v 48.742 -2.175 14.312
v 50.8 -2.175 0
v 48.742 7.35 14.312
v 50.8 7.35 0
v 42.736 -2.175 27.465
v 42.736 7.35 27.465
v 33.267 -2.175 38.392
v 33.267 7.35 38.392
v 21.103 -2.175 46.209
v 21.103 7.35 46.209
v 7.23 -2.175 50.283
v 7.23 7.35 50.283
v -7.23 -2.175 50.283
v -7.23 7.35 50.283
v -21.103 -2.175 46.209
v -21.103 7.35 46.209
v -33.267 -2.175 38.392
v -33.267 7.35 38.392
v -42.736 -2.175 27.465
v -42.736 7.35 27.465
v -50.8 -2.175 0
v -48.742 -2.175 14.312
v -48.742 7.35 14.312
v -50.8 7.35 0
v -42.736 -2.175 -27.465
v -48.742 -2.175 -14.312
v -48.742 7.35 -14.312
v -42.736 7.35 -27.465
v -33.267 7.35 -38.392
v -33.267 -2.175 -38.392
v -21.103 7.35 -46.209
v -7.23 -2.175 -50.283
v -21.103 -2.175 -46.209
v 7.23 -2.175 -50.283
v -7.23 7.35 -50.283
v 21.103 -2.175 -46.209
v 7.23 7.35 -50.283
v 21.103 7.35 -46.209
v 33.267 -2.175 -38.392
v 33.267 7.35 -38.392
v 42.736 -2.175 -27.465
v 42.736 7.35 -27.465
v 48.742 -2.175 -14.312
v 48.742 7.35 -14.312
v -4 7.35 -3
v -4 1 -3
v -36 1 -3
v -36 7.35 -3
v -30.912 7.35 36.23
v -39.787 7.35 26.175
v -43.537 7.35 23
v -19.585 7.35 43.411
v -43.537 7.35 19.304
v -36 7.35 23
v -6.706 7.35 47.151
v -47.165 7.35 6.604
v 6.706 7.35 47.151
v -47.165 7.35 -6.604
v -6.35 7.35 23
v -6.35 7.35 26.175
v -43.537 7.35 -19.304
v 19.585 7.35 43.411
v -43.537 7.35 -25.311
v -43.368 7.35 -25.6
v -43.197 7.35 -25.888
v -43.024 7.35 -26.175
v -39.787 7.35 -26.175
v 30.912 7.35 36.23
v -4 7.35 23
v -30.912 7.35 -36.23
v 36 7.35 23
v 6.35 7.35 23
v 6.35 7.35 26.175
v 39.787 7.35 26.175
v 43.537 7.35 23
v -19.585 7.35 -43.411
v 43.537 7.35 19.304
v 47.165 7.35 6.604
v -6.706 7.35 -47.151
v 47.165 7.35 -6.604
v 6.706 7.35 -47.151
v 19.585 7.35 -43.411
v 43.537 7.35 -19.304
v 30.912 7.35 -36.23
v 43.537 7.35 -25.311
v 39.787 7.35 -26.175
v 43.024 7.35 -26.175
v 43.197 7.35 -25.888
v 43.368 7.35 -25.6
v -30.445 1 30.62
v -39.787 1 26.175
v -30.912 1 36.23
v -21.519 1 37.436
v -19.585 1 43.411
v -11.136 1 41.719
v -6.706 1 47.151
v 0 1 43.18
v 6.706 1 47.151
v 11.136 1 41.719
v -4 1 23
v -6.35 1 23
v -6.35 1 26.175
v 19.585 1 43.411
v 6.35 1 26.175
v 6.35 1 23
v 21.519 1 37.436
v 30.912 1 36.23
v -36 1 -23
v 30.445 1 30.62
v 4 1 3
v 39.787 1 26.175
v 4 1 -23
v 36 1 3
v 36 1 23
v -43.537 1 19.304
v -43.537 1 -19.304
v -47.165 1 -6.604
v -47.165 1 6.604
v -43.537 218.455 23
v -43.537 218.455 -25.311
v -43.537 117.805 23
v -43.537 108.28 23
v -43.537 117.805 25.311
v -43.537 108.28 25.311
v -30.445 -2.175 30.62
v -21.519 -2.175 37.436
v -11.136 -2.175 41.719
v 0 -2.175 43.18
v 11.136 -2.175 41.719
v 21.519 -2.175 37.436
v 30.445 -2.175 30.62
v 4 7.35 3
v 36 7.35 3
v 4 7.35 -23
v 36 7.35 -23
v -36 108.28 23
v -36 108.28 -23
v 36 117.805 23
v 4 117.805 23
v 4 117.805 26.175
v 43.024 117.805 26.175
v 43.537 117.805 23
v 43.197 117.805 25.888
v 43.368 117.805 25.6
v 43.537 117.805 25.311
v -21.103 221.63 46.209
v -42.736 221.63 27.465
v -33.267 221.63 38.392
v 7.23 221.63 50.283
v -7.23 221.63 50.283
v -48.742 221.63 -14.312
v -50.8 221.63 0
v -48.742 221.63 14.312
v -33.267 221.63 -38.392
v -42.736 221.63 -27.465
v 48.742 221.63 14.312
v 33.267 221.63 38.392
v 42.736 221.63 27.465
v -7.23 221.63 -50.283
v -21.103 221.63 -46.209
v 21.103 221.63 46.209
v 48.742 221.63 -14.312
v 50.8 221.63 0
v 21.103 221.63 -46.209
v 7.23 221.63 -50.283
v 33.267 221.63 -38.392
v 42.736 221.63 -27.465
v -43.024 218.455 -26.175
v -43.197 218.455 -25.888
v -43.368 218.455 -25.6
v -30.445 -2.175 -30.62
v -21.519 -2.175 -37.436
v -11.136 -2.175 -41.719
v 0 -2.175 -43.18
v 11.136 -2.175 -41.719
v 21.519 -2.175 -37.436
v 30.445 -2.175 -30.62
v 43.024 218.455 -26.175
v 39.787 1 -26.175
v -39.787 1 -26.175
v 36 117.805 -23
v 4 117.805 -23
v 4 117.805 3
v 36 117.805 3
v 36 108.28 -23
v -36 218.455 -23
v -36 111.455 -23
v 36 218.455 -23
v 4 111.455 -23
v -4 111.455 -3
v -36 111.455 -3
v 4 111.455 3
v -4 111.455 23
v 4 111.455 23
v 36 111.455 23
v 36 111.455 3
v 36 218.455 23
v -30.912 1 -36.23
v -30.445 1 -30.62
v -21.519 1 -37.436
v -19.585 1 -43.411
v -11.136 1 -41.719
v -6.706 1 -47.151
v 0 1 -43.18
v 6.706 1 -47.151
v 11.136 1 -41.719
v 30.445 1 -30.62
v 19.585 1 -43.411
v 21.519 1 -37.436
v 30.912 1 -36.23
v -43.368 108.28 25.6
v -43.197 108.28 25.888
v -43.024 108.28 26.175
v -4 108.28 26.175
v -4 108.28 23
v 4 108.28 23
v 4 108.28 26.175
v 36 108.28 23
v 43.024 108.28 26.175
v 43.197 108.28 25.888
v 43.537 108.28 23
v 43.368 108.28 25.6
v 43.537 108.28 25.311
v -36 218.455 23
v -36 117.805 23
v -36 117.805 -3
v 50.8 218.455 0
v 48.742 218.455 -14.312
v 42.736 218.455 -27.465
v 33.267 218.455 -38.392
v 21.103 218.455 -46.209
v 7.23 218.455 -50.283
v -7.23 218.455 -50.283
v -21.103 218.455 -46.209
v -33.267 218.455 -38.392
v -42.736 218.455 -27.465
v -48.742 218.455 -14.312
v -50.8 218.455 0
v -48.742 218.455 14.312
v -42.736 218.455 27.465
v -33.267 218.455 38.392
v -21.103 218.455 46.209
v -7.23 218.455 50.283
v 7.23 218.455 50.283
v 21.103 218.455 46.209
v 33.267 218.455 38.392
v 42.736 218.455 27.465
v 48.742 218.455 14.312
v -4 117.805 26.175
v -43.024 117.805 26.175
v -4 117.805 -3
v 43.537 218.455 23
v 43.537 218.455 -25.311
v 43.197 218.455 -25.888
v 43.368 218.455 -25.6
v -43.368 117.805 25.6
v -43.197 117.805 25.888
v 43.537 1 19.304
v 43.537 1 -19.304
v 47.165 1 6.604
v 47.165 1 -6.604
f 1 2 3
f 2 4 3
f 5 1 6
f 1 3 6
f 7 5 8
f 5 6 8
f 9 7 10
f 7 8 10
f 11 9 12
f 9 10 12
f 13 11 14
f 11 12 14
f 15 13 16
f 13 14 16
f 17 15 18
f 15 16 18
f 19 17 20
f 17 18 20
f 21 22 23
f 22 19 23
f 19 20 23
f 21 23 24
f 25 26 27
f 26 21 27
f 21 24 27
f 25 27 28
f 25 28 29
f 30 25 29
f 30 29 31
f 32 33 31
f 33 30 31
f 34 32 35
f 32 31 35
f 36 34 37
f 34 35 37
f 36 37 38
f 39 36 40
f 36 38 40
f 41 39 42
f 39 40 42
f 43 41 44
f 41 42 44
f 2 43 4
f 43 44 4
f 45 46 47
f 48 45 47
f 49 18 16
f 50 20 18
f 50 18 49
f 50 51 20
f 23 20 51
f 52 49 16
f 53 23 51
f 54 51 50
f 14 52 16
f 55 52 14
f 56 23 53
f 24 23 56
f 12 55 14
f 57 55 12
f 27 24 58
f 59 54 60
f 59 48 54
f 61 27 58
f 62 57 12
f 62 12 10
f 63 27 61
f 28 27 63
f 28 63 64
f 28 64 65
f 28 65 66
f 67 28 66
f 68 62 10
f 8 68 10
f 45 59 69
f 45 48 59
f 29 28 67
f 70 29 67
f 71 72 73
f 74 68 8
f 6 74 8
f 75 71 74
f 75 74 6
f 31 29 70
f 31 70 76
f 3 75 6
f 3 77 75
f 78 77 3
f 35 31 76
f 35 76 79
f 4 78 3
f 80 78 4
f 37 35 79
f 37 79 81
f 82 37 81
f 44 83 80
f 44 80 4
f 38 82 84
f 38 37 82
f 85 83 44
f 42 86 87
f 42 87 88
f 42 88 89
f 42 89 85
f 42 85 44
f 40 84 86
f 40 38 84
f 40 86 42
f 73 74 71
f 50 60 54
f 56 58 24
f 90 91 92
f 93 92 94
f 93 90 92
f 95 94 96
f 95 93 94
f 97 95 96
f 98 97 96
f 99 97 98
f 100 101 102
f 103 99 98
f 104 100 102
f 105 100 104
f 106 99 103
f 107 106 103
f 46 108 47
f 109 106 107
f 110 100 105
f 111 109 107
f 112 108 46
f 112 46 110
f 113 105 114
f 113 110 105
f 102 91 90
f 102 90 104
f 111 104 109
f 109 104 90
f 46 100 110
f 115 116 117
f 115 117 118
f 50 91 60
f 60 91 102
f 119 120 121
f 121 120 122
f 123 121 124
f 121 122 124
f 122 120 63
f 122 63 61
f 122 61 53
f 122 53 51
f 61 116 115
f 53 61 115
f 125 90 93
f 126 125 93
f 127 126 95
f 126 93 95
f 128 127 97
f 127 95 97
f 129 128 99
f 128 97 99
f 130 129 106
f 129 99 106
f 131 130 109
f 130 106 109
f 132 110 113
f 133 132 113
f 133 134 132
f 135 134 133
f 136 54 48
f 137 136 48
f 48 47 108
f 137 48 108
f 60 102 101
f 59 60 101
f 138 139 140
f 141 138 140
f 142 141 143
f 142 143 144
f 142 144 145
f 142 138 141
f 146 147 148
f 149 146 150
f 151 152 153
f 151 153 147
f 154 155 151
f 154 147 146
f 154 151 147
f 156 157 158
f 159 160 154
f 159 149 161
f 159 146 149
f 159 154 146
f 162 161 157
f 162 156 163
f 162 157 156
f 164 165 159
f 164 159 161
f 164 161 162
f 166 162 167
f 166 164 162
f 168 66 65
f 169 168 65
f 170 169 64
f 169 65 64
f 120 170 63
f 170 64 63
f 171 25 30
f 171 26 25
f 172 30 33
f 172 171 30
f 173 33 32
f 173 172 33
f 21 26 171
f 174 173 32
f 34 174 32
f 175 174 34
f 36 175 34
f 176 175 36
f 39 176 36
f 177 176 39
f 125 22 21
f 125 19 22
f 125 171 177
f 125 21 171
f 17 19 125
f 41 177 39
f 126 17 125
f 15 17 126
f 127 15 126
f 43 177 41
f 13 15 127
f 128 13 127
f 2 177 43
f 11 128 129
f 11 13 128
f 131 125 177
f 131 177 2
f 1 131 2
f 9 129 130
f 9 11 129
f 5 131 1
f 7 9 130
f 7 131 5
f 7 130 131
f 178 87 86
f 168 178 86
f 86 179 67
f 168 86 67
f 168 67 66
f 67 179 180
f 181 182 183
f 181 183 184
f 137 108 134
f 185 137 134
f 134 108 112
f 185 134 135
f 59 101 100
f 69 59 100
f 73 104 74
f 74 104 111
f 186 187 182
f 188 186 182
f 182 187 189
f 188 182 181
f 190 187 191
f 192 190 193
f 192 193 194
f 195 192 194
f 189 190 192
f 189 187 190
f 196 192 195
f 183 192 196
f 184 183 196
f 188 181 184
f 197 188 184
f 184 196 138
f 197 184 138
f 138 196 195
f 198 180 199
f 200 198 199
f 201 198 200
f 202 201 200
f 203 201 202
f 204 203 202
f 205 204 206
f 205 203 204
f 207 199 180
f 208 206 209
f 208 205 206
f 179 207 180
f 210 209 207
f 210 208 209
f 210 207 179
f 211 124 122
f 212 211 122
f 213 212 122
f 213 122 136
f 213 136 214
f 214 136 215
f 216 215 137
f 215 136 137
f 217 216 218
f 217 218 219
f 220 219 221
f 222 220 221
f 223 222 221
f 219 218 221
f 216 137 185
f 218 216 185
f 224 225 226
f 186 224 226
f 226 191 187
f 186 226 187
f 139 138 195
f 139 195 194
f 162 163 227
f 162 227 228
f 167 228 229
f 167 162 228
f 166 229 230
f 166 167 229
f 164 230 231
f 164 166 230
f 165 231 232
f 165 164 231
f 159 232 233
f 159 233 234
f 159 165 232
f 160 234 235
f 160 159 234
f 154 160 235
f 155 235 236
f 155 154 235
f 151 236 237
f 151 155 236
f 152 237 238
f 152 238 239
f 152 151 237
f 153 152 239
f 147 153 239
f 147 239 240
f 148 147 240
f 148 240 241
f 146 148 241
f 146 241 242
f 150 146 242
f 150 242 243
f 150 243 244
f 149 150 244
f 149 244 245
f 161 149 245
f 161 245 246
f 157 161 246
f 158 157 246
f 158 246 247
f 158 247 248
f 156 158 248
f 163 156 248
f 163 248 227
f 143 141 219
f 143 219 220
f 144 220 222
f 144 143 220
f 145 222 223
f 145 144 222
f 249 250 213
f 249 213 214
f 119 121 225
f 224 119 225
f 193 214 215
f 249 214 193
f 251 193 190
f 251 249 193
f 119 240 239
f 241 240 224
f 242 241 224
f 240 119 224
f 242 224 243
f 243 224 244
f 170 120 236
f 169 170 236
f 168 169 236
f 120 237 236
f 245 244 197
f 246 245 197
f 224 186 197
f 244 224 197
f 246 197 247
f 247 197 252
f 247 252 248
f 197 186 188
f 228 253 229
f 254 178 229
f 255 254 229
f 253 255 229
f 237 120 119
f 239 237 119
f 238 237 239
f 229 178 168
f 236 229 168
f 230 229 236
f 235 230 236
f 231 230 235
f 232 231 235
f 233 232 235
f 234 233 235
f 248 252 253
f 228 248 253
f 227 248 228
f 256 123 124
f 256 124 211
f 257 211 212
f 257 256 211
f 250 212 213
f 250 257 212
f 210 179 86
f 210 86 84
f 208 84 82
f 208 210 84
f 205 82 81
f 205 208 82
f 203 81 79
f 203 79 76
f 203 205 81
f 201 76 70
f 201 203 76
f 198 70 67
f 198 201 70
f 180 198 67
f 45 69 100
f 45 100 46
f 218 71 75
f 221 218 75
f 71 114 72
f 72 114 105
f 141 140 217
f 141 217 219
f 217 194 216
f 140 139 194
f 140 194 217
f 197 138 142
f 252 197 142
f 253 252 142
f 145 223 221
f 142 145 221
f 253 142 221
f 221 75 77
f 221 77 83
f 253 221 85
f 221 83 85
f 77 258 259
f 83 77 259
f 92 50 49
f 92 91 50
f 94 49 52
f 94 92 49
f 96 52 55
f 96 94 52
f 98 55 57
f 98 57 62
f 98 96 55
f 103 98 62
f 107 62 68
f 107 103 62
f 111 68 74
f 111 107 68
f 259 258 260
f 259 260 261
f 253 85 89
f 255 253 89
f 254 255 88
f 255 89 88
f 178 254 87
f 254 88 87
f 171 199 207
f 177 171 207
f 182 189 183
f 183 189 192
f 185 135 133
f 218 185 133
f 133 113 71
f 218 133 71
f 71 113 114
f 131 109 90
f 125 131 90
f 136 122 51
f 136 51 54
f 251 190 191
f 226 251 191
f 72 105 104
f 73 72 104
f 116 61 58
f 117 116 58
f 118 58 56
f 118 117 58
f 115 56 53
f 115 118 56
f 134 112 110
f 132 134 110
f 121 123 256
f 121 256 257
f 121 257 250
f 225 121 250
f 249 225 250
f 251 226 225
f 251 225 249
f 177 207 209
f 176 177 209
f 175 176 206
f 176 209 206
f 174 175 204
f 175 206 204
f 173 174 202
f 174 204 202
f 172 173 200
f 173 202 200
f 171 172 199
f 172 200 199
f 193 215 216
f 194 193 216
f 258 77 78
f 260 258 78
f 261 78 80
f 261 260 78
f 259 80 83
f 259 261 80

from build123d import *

# Parameters (mm, degrees)
SKETCH1_R            = 50.8
BOSS_EXTRUDE1_DEPTH  = 1
SKETCH4_W            = 6.35
SKETCH4_H            = 3
BOSS_EXTRUDE2_DEPTH  = 6.35
SKETCH6_R            = 50.8
SKETCH6_R_2          = 47.625
BOSS_EXTRUDE3_DEPTH  = 6.35
BOSS_EXTRUDE5_DEPTH  = 107.280000006
BOSS_EXTRUDE10_START = -6.35
BOSS_EXTRUDE10_DEPTH = 107.28
SKETCH12_W           = 72.000000018
SKETCH12_H           = 46
BOSS_EXTRUDE13_DEPTH = 3.175
BOSS_EXTRUDE14_DEPTH = 6.35
BOSS_EXTRUDE16_DEPTH = 6.35
BOSS_EXTRUDE17_DEPTH = 9.525
BOSS_EXTRUDE18_DEPTH = 101
SKETCH18_W           = 7.999999982
SKETCH18_H           = 6.35
BOSS_EXTRUDE19_DEPTH = 3.175
SKETCH19_W           = 7.999999982
SKETCH19_H           = 6
CUT_EXTRUDE1_DEPTH   = 6.35
SKETCH20_W           = 7.999999982
SKETCH20_H           = 6
CUT_EXTRUDE2_DEPTH   = 6.35
BOSS_EXTRUDE21_DEPTH = 6
CUT_EXTRUDE3_DEPTH   = 2
SKETCH24_R           = 50.8
BOSS_EXTRUDE22_DEPTH = 6.35
SKETCH25_R           = 50.8
CUT_EXTRUDE4_DEPTH   = 3.175
SKETCH26_R           = 50.8
BOSS_EXTRUDE23_DEPTH = 5.35
SKETCH28_R           = 60.968632161
CUT_EXTRUDE5_DEPTH   = 3.175


with BuildPart() as part:
    # Sketch1 → Boss-Extrude1 (new body)
    with BuildSketch(Plane(origin=(0, 0, 0), x_dir=(1, 0, 0), z_dir=(0, 1, 0))):
        Circle(SKETCH1_R)
    extrude(amount=BOSS_EXTRUDE1_DEPTH)

    # Sketch4 → Boss-Extrude2 (add)
    with BuildSketch(Plane(origin=(0, 1, 0), x_dir=(1, 0, 0), z_dir=(0, 1, 0))):
        Polygon((-36.000000009, 18), (-36.000000009, 23), (-26.000000009, 23), (-6.35, 23), (-6.35, 26.175), (-39.175000009, 26.175), (-39.175000009, -26.175), (-6.35, -26.175), (-6.35, -23), (-36.000000009, -23), (-36.000000009, 3), align=None)
        Polygon((6.35, 26.175), (6.35, 23), (36.000000009, 23), (36.000000009, -3), (36.000000009, -18), (36.000000009, -23), (26.000000009, -23), (6.35, -23), (6.35, -26.175), (39.175000009, -26.175), (39.175000009, 26.175), align=None)
        Polygon((-26.000000009, 3), (-36.000000009, 3), (-36.000000009, -23), (-6.35, -23), (-6.35, 0), (-6.35, 3), align=None)
        Polygon((36.000000009, 23), (6.35, 23), (6.35, 0), (6.35, -3), (26.000000009, -3), (36.000000009, -3), align=None)
        with Locations((-3.175, 1.5)):
            Rectangle(SKETCH4_W, SKETCH4_H)
        Polygon((6.35, 23), (3.999999991, 23), (3.999999991, 18), (3.999999991, 3), (0, 3), (0, 0), (6.35, 0), align=None)
        with Locations((3.175, -1.5)):
            Rectangle(SKETCH4_W, SKETCH4_H)
        Polygon((-6.35, 0), (-6.35, -23), (-3.999999991, -23), (-3.999999991, -18), (-3.999999991, -3), (0, -3), (0, 0), align=None)
    extrude(amount=BOSS_EXTRUDE2_DEPTH)

    # Sketch6 → Boss-Extrude3 (add)
    with BuildSketch(Plane(origin=(0, 1, 0), x_dir=(1, 0, 0), z_dir=(0, 1, 0))):
        Circle(SKETCH6_R)
        Circle(SKETCH6_R_2, mode=Mode.SUBTRACT)
    extrude(amount=BOSS_EXTRUDE3_DEPTH)

    # Sketch8 → Boss-Extrude5 (add)
    with BuildSketch(Plane(origin=(0, 1, 0), x_dir=(1, 0, 0), z_dir=(0, 1, 0))):
        with BuildLine():
            Line((-39.175000009, -23), (-39.175000009, 23))
            Line((-39.175000009, 23), (-41.703004988, 23))
            ThreePointArc((-41.703004988, 23), (-42.660279406, 21.171707206), (-43.537447961, 19.30365898))
            Line((-43.537447961, 19.30365898), (-43.537447961, -19.30365898))
            ThreePointArc((-43.537447961, -19.30365898), (-42.660279406, -21.171707206), (-41.703004988, -23))
            Line((-41.703004988, -23), (-39.175000009, -23))
        make_face()
        Polygon((-36.000000009, 3), (-36.000000009, 23), (-39.175000009, 23), (-39.175000009, -23), (-36.000000009, -23), align=None)
        Polygon((39.175000009, 23), (36.000000009, 23), (36.000000009, -3), (36.000000009, -23), (39.175000009, -23), align=None)
        with BuildLine():
            ThreePointArc((43.537447961, 19.30365898), (42.660279406, 21.171707206), (41.703004988, 23))
            Line((41.703004988, 23), (39.175000009, 23))
            Line((39.175000009, 23), (39.175000009, -23))
            Line((39.175000009, -23), (41.703004988, -23))
            ThreePointArc((41.703004988, -23), (42.660279406, -21.171707206), (43.537447961, -19.30365898))
            Line((43.537447961, -19.30365898), (43.537447961, 19.30365898))
        make_face()
        with BuildLine():
            Line((43.537447961, 23), (41.703004988, 23))
            ThreePointArc((41.703004988, 23), (42.660279406, 21.171707206), (43.537447961, 19.30365898))
            Line((43.537447961, 19.30365898), (43.537447961, 23))
        make_face()
        with BuildLine():
            ThreePointArc((43.537447961, -19.30365898), (42.660279406, -21.171707206), (41.703004988, -23))
            Line((41.703004988, -23), (43.537447961, -23))
            Line((43.537447961, -23), (43.537447961, -19.30365898))
        make_face()
        with BuildLine():
            Line((-43.537447961, -23), (-41.703004988, -23))
            ThreePointArc((-41.703004988, -23), (-42.660279406, -21.171707206), (-43.537447961, -19.30365898))
            Line((-43.537447961, -19.30365898), (-43.537447961, -23))
        make_face()
        with BuildLine():
            ThreePointArc((-43.537447961, 19.30365898), (-42.660279406, 21.171707206), (-41.703004988, 23))
            Line((-41.703004988, 23), (-43.537447961, 23))
            Line((-43.537447961, 23), (-43.537447961, 19.30365898))
        make_face()
    extrude(amount=BOSS_EXTRUDE5_DEPTH)

    # Sketch9 → Boss-Extrude10 (add)
    with BuildSketch(Plane(origin=(0, 7.35, 0), x_dir=(1, 0, 0), z_dir=(0, 1, 0)).offset(BOSS_EXTRUDE10_START)):
        with BuildLine():
            Line((-43.537447961, 25.31123991), (-43.537447961, 23))
            Line((-43.537447961, 23), (43.537447961, 23))
            Line((43.537447961, 23), (43.537447961, 25.31123991))
            ThreePointArc((43.537447961, 25.31123991), (43.28272205, 25.744401579), (43.023686683, 26.175))
            Line((43.023686683, 26.175), (-43.023686683, 26.175))
            ThreePointArc((-43.023686683, 26.175), (-43.28272205, 25.744401579), (-43.537447961, 25.31123991))
        make_face()
    extrude(amount=BOSS_EXTRUDE10_DEPTH)

    # Sketch12 → Boss-Extrude13 (add)
    with BuildSketch(Plane(origin=(0, 108.280000006, 0), x_dir=(1, 0, 0), z_dir=(0, 1, 0))):
        with BuildLine():
            Line((-36.000000009, 23), (36.000000009, 23))
            Line((36.000000009, 23), (36.000000009, -23))
            Line((36.000000009, -23), (43.537447961, -23))
            Line((43.537447961, -23), (43.537447961, 25.31123991))
            ThreePointArc((43.537447961, 25.31123991), (43.28272205, 25.744401579), (43.023686683, 26.175))
            Line((43.023686683, 26.175), (-43.023686683, 26.175))
            ThreePointArc((-43.023686683, 26.175), (-43.28272205, 25.744401579), (-43.537447961, 25.31123991))
            Line((-43.537447961, 25.31123991), (-43.537447961, -23))
            Line((-43.537447961, -23), (-36.000000009, -23))
            Line((-36.000000009, -23), (-36.000000009, 23))
        make_face()
        Rectangle(SKETCH12_W, SKETCH12_H)
    extrude(amount=BOSS_EXTRUDE13_DEPTH)

    # Sketch13 → Boss-Extrude14 (add)
    with BuildSketch(Plane(origin=(0, 111.455000006, 0), x_dir=(1, 0, 0), z_dir=(0, 1, 0))):
        Polygon((-3.999999991, -3), (36.000000009, -3), (36.000000009, 23), (3.999999991, 23), (3.999999991, 3), (-36.000000009, 3), (-36.000000009, -23), (-6.35, -23), (-3.999999991, -23), align=None)
        with BuildLine():
            Line((36.000000009, -23), (39.175000009, -23))
            Line((39.175000009, -23), (41.703004988, -23))
            Line((41.703004988, -23), (43.537447961, -23))
            Line((43.537447961, -23), (43.537447961, 25.31123991))
            ThreePointArc((43.537447961, 25.31123991), (43.28272205, 25.744401579), (43.023686683, 26.175))
            Line((43.023686683, 26.175), (3.999999991, 26.175))
            Line((3.999999991, 26.175), (3.999999991, 23))
            Line((3.999999991, 23), (36.000000009, 23))
            Line((36.000000009, 23), (36.000000009, -3))
            Line((36.000000009, -3), (36.000000009, -23))
        make_face()
        with BuildLine():
            Line((-43.537447961, -23), (-41.703004988, -23))
            Line((-41.703004988, -23), (-39.175000009, -23))
            Line((-39.175000009, -23), (-36.000000009, -23))
            Line((-36.000000009, -23), (-36.000000009, 3))
            Line((-36.000000009, 3), (-36.000000009, 23))
            Line((-36.000000009, 23), (-3.999999991, 23))
            Line((-3.999999991, 23), (-3.999999991, 26.175))
            Line((-3.999999991, 26.175), (-43.023686683, 26.175))
            ThreePointArc((-43.023686683, 26.175), (-43.28272205, 25.744401579), (-43.537447961, 25.31123991))
            Line((-43.537447961, 25.31123991), (-43.537447961, -23))
        make_face()
    extrude(amount=BOSS_EXTRUDE14_DEPTH)

    # Sketch15 → Boss-Extrude16 (add)
    with BuildSketch(Plane(origin=(0, 1, 0), x_dir=(1, 0, 0), z_dir=(0, 1, 0))):
        with BuildLine():
            Line((39.175000009, -26.175), (39.787058197, -26.175))
            ThreePointArc((39.787058197, -26.175), (40.775945798, -24.60615511), (41.703004988, -23))
            Line((41.703004988, -23), (39.175000009, -23))
            Line((39.175000009, -23), (39.175000009, -26.175))
        make_face()
        with BuildLine():
            Line((-39.787058197, -26.175), (-39.175000009, -26.175))
            Line((-39.175000009, -26.175), (-39.175000009, -23))
            Line((-39.175000009, -23), (-41.703004988, -23))
            ThreePointArc((-41.703004988, -23), (-40.775945798, -24.60615511), (-39.787058197, -26.175))
        make_face()
    extrude(amount=BOSS_EXTRUDE16_DEPTH)

    # Sketch16 → Boss-Extrude17 (add)
    with BuildSketch(Plane(origin=(0, 117.805000006, 0), x_dir=(1, 0, 0), z_dir=(0, 1, 0))):
        with BuildLine():
            Line((-3.999999991, -23), (-43.537447961, -23))
            Line((-43.537447961, -23), (-43.537447961, -25.31123991))
            ThreePointArc((-43.537447961, -25.31123991), (-43.28272205, -25.744401579), (-43.023686683, -26.175))
            Line((-43.023686683, -26.175), (-3.999999991, -26.175))
            Line((-3.999999991, -26.175), (-3.999999991, -23))
        make_face()
        with BuildLine():
            Line((43.537447961, -23), (3.999999991, -23))
            Line((3.999999991, -23), (3.999999991, -26.175))
            Line((3.999999991, -26.175), (43.023686683, -26.175))
            ThreePointArc((43.023686683, -26.175), (43.28272205, -25.744401579), (43.537447961, -25.31123991))
            Line((43.537447961, -25.31123991), (43.537447961, -23))
        make_face()
    extrude(amount=-BOSS_EXTRUDE17_DEPTH)

    # Sketch17 → Boss-Extrude18 (add)
    with BuildSketch(Plane(origin=(0, 117.805000006, 0), x_dir=(1, 0, 0), z_dir=(0, 1, 0))):
        with BuildLine():
            ThreePointArc((43.537447961, 25.31123991), (43.28272205, 25.744401579), (43.023686683, 26.175))
            Line((43.023686683, 26.175), (-43.023686683, 26.175))
            ThreePointArc((-43.023686683, 26.175), (-43.28272205, 25.744401579), (-43.537447961, 25.31123991))
            Line((-43.537447961, 25.31123991), (-43.537447961, -23))
            Line((-43.537447961, -23), (-36.000000009, -23))
            Line((-36.000000009, -23), (-36.000000009, 23))
            Line((-36.000000009, 23), (36.000000009, 23))
            Line((36.000000009, 23), (36.000000009, -23))
            Line((36.000000009, -23), (43.537447961, -23))
            Line((43.537447961, -23), (43.537447961, 25.31123991))
        make_face()
    extrude(amount=BOSS_EXTRUDE18_DEPTH)

    # Sketch18 → Boss-Extrude19 (add)
    with BuildSketch(Plane(origin=(0, 0, -26.175), x_dir=(-1, 0, 0), z_dir=(0, 0, -1))):
        with Locations((0, 114.630000006)):
            Rectangle(SKETCH18_W, SKETCH18_H)
    extrude(amount=-BOSS_EXTRUDE19_DEPTH)

    # Sketch19 → Cut-Extrude1 (cut)
    with BuildSketch(Plane(origin=(0, 117.805000006, 0), x_dir=(1, 0, 0), z_dir=(0, 1, 0))):
        Rectangle(SKETCH19_W, SKETCH19_H)
    extrude(amount=-CUT_EXTRUDE1_DEPTH, mode=Mode.SUBTRACT)

    # Sketch20 → Cut-Extrude2 (cut)
    with BuildSketch(Plane(origin=(0, 7.35, 0), x_dir=(1, 0, 0), z_dir=(0, 1, 0))):
        Rectangle(SKETCH20_W, SKETCH20_H)
    extrude(amount=-CUT_EXTRUDE2_DEPTH, mode=Mode.SUBTRACT)

    # Sketch21 → Boss-Extrude21 (add)
    with BuildSketch(Plane(origin=(0, 218.805000006, 0), x_dir=(1, 0, 0), z_dir=(0, 1, 0))):
        with BuildLine():
            Line((-43.537447961, 25.31123991), (-43.537447961, -23))
            Line((-43.537447961, -23), (-36.000000009, -23))
            Line((-36.000000009, -23), (-36.000000009, 23))
            Line((-36.000000009, 23), (36.000000009, 23))
            Line((36.000000009, 23), (36.000000009, -23))
            Line((36.000000009, -23), (43.537447961, -23))
            Line((43.537447961, -23), (43.537447961, 25.31123991))
            ThreePointArc((43.537447961, 25.31123991), (43.28272205, 25.744401579), (43.023686683, 26.175))
            Line((43.023686683, 26.175), (-43.023686683, 26.175))
            ThreePointArc((-43.023686683, 26.175), (-43.28272205, 25.744401579), (-43.537447961, 25.31123991))
        make_face()
        with BuildLine():
            ThreePointArc((-43.537447961, -25.31123991), (-43.28272205, -25.744401579), (-43.023686683, -26.175))
            Line((-43.023686683, -26.175), (43.023686683, -26.175))
            ThreePointArc((43.023686683, -26.175), (43.28272205, -25.744401579), (43.537447961, -25.31123991))
            Line((43.537447961, -25.31123991), (43.537447961, -23))
            Line((43.537447961, -23), (36.000000009, -23))
            Line((36.000000009, -23), (36.000000009, 23))
            Line((36.000000009, 23), (-36.000000009, 23))
            Line((-36.000000009, 23), (-36.000000009, -23))
            Line((-36.000000009, -23), (-43.537447961, -23))
            Line((-43.537447961, -23), (-43.537447961, -25.31123991))
        make_face()
    extrude(amount=BOSS_EXTRUDE21_DEPTH)

    # Sketch23 → Cut-Extrude3 (cut, through all)
    with BuildSketch(Plane(origin=(0, 1, 0), x_dir=(1, 0, 0), z_dir=(0, 1, 0))):
        with BuildLine():
            Line((-6.35, -30.62), (-30.445492277, -30.62))
            ThreePointArc((-30.445492277, -30.62), (0, -43.18), (30.445492277, -30.62))
            Line((30.445492277, -30.62), (6.35, -30.62))
            Line((6.35, -30.62), (-6.35, -30.62))
        make_face()
        with BuildLine():
            Line((-30.445492277, 30.62), (30.445492277, 30.62))
            ThreePointArc((30.445492277, 30.62), (0, 43.18), (-30.445492277, 30.62))
        make_face()
    extrude(amount=-CUT_EXTRUDE3_DEPTH, mode=Mode.SUBTRACT)

    # Sketch24 → Boss-Extrude22 (add)
    with BuildSketch(Plane(origin=(0, 224.805000006, 0), x_dir=(1, 0, 0), z_dir=(0, 1, 0))):
        Circle(SKETCH24_R)
    extrude(amount=-BOSS_EXTRUDE22_DEPTH)

    # Sketch25 → Cut-Extrude4 (cut)
    with BuildSketch(Plane(origin=(0, 224.805000006, 0), x_dir=(1, 0, 0), z_dir=(0, 1, 0))):
        Circle(SKETCH25_R)
    extrude(amount=-CUT_EXTRUDE4_DEPTH, mode=Mode.SUBTRACT)

    # Sketch26 → Boss-Extrude23 (add)
    with BuildSketch(Plane.XZ):
        Circle(SKETCH26_R)
        with BuildLine():
            Line((-30.445492277, -30.62), (30.445492277, -30.62))
            ThreePointArc((30.445492277, -30.62), (0, -43.18), (-30.445492277, -30.62))
        make_face(mode=Mode.SUBTRACT)
        with BuildLine():
            Line((30.445492277, 30.62), (-30.445492277, 30.62))
            ThreePointArc((-30.445492277, 30.62), (0, 43.18), (30.445492277, 30.62))
        make_face(mode=Mode.SUBTRACT)
    extrude(amount=BOSS_EXTRUDE23_DEPTH)

    # Sketch28 → Cut-Extrude5 (cut)
    with BuildSketch(Plane.XZ.offset(5.35)):
        Circle(SKETCH28_R)
    extrude(amount=-CUT_EXTRUDE5_DEPTH, mode=Mode.SUBTRACT)


solid = part.part
